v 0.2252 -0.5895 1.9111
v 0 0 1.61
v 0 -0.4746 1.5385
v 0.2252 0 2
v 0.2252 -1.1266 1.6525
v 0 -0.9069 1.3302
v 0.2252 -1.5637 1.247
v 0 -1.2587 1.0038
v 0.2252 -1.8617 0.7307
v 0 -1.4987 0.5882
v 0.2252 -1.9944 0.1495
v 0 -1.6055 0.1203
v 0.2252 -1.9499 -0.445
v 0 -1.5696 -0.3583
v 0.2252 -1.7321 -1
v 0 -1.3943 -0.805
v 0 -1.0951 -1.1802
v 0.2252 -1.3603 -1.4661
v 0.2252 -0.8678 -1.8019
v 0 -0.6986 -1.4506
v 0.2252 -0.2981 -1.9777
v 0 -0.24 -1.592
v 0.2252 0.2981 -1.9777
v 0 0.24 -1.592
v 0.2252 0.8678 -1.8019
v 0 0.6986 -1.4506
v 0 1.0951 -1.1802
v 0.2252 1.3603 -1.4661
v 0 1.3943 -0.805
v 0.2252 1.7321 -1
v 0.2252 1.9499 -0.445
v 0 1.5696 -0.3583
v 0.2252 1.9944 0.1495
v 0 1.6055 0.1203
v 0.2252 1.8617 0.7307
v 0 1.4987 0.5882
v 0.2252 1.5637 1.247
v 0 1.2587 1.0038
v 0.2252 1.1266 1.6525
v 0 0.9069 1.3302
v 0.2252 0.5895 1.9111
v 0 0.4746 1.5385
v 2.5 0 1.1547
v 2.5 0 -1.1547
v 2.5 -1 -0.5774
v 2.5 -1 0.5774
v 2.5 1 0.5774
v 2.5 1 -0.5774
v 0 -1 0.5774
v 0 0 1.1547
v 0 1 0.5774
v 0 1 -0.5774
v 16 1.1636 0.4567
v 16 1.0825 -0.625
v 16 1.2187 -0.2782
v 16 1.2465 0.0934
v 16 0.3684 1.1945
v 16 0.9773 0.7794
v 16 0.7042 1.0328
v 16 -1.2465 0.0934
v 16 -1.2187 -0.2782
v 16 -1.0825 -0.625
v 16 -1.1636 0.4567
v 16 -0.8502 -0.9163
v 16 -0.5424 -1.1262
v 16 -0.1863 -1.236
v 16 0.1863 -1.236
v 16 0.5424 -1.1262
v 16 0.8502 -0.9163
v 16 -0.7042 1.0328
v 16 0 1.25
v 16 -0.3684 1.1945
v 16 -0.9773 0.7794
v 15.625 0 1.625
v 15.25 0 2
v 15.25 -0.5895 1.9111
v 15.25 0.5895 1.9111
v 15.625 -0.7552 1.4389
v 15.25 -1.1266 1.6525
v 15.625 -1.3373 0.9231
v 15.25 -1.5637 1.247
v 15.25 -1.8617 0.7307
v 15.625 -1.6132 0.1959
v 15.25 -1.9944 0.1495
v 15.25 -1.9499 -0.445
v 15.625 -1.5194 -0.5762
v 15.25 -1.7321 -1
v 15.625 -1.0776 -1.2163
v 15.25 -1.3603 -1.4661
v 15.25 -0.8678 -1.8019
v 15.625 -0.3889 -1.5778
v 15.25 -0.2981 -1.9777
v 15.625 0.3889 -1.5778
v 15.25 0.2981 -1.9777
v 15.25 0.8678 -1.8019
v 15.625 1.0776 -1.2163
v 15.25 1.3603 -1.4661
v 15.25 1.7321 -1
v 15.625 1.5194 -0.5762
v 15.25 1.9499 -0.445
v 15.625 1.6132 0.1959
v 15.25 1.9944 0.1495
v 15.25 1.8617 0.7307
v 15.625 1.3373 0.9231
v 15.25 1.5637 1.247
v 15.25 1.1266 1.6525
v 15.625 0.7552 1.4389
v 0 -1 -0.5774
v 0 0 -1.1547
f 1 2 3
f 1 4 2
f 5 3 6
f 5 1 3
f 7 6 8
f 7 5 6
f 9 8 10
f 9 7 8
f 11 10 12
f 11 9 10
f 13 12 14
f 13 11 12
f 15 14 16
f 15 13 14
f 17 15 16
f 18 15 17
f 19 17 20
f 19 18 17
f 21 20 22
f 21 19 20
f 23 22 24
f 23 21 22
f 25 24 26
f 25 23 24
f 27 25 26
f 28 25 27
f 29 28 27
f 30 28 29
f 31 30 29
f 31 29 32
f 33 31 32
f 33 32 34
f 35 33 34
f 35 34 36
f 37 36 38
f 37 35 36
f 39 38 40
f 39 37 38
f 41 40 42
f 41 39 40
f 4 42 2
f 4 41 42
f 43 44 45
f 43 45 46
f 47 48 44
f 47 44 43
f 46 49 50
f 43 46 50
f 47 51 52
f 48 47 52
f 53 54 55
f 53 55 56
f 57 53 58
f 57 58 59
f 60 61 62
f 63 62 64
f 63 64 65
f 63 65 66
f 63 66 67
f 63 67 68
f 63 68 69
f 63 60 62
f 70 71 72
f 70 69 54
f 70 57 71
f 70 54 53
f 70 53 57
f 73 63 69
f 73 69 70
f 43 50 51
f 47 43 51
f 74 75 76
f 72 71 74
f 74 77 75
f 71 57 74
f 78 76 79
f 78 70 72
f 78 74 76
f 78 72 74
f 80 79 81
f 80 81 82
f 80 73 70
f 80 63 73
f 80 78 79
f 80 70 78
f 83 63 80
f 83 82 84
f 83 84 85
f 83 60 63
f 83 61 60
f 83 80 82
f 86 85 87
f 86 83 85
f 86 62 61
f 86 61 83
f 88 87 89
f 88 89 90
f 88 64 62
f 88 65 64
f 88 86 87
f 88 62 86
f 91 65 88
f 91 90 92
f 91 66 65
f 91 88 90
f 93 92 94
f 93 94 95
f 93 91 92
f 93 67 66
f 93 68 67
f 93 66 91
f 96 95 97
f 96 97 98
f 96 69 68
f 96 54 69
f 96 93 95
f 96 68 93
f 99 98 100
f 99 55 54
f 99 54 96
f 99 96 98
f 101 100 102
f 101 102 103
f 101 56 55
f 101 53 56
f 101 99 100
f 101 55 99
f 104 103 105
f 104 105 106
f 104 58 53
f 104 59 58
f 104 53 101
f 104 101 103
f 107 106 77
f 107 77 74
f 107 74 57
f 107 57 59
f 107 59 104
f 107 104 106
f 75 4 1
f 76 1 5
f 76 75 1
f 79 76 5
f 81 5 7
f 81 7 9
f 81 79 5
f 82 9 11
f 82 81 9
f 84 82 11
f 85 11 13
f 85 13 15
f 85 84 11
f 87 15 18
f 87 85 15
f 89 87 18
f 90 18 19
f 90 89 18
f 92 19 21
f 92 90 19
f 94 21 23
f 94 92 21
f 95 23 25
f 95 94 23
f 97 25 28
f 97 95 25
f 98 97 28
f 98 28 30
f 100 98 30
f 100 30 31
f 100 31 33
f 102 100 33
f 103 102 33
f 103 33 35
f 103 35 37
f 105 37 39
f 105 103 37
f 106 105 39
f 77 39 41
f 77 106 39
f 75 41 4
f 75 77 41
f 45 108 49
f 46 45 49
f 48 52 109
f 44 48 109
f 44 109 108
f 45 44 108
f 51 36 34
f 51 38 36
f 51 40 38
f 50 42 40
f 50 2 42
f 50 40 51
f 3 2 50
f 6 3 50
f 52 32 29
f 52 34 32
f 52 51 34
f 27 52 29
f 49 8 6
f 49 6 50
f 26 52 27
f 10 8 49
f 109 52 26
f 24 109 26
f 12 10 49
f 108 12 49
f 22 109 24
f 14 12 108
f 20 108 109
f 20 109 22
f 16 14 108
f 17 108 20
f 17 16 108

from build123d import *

# Parameters (mm, degrees)
HEX_2_DEPTH = 2.5


with BuildPart() as part:
    # BodySke → BaseBody (revolve)
    with BuildSketch(Plane.XY, mode=Mode.PRIVATE) as basebody_sk:
        Polygon((0, 0), (0, 1.61), (0.225166605, 2), (15.25, 2), (16, 1.25), (16, 0), align=None)
    revolve(basebody_sk.sketch.rotate(Axis((-12.7, 0, 0), (1, 0, 0)), 90), axis=Axis((-12.7, 0, 0), (1, 0, 0)))  # turned: the seam where the file's is

    # Sketch2 → Hex 2 (cut)
    with BuildSketch(Plane.ZY):
        Polygon((0.577350269, 1), (-0.577350269, 1), (-1.154700538, 0), (-0.577350269, -1), (0.577350269, -1), (1.154700538, 0), align=None)
    extrude(amount=-HEX_2_DEPTH, mode=Mode.SUBTRACT)


solid = part.part
